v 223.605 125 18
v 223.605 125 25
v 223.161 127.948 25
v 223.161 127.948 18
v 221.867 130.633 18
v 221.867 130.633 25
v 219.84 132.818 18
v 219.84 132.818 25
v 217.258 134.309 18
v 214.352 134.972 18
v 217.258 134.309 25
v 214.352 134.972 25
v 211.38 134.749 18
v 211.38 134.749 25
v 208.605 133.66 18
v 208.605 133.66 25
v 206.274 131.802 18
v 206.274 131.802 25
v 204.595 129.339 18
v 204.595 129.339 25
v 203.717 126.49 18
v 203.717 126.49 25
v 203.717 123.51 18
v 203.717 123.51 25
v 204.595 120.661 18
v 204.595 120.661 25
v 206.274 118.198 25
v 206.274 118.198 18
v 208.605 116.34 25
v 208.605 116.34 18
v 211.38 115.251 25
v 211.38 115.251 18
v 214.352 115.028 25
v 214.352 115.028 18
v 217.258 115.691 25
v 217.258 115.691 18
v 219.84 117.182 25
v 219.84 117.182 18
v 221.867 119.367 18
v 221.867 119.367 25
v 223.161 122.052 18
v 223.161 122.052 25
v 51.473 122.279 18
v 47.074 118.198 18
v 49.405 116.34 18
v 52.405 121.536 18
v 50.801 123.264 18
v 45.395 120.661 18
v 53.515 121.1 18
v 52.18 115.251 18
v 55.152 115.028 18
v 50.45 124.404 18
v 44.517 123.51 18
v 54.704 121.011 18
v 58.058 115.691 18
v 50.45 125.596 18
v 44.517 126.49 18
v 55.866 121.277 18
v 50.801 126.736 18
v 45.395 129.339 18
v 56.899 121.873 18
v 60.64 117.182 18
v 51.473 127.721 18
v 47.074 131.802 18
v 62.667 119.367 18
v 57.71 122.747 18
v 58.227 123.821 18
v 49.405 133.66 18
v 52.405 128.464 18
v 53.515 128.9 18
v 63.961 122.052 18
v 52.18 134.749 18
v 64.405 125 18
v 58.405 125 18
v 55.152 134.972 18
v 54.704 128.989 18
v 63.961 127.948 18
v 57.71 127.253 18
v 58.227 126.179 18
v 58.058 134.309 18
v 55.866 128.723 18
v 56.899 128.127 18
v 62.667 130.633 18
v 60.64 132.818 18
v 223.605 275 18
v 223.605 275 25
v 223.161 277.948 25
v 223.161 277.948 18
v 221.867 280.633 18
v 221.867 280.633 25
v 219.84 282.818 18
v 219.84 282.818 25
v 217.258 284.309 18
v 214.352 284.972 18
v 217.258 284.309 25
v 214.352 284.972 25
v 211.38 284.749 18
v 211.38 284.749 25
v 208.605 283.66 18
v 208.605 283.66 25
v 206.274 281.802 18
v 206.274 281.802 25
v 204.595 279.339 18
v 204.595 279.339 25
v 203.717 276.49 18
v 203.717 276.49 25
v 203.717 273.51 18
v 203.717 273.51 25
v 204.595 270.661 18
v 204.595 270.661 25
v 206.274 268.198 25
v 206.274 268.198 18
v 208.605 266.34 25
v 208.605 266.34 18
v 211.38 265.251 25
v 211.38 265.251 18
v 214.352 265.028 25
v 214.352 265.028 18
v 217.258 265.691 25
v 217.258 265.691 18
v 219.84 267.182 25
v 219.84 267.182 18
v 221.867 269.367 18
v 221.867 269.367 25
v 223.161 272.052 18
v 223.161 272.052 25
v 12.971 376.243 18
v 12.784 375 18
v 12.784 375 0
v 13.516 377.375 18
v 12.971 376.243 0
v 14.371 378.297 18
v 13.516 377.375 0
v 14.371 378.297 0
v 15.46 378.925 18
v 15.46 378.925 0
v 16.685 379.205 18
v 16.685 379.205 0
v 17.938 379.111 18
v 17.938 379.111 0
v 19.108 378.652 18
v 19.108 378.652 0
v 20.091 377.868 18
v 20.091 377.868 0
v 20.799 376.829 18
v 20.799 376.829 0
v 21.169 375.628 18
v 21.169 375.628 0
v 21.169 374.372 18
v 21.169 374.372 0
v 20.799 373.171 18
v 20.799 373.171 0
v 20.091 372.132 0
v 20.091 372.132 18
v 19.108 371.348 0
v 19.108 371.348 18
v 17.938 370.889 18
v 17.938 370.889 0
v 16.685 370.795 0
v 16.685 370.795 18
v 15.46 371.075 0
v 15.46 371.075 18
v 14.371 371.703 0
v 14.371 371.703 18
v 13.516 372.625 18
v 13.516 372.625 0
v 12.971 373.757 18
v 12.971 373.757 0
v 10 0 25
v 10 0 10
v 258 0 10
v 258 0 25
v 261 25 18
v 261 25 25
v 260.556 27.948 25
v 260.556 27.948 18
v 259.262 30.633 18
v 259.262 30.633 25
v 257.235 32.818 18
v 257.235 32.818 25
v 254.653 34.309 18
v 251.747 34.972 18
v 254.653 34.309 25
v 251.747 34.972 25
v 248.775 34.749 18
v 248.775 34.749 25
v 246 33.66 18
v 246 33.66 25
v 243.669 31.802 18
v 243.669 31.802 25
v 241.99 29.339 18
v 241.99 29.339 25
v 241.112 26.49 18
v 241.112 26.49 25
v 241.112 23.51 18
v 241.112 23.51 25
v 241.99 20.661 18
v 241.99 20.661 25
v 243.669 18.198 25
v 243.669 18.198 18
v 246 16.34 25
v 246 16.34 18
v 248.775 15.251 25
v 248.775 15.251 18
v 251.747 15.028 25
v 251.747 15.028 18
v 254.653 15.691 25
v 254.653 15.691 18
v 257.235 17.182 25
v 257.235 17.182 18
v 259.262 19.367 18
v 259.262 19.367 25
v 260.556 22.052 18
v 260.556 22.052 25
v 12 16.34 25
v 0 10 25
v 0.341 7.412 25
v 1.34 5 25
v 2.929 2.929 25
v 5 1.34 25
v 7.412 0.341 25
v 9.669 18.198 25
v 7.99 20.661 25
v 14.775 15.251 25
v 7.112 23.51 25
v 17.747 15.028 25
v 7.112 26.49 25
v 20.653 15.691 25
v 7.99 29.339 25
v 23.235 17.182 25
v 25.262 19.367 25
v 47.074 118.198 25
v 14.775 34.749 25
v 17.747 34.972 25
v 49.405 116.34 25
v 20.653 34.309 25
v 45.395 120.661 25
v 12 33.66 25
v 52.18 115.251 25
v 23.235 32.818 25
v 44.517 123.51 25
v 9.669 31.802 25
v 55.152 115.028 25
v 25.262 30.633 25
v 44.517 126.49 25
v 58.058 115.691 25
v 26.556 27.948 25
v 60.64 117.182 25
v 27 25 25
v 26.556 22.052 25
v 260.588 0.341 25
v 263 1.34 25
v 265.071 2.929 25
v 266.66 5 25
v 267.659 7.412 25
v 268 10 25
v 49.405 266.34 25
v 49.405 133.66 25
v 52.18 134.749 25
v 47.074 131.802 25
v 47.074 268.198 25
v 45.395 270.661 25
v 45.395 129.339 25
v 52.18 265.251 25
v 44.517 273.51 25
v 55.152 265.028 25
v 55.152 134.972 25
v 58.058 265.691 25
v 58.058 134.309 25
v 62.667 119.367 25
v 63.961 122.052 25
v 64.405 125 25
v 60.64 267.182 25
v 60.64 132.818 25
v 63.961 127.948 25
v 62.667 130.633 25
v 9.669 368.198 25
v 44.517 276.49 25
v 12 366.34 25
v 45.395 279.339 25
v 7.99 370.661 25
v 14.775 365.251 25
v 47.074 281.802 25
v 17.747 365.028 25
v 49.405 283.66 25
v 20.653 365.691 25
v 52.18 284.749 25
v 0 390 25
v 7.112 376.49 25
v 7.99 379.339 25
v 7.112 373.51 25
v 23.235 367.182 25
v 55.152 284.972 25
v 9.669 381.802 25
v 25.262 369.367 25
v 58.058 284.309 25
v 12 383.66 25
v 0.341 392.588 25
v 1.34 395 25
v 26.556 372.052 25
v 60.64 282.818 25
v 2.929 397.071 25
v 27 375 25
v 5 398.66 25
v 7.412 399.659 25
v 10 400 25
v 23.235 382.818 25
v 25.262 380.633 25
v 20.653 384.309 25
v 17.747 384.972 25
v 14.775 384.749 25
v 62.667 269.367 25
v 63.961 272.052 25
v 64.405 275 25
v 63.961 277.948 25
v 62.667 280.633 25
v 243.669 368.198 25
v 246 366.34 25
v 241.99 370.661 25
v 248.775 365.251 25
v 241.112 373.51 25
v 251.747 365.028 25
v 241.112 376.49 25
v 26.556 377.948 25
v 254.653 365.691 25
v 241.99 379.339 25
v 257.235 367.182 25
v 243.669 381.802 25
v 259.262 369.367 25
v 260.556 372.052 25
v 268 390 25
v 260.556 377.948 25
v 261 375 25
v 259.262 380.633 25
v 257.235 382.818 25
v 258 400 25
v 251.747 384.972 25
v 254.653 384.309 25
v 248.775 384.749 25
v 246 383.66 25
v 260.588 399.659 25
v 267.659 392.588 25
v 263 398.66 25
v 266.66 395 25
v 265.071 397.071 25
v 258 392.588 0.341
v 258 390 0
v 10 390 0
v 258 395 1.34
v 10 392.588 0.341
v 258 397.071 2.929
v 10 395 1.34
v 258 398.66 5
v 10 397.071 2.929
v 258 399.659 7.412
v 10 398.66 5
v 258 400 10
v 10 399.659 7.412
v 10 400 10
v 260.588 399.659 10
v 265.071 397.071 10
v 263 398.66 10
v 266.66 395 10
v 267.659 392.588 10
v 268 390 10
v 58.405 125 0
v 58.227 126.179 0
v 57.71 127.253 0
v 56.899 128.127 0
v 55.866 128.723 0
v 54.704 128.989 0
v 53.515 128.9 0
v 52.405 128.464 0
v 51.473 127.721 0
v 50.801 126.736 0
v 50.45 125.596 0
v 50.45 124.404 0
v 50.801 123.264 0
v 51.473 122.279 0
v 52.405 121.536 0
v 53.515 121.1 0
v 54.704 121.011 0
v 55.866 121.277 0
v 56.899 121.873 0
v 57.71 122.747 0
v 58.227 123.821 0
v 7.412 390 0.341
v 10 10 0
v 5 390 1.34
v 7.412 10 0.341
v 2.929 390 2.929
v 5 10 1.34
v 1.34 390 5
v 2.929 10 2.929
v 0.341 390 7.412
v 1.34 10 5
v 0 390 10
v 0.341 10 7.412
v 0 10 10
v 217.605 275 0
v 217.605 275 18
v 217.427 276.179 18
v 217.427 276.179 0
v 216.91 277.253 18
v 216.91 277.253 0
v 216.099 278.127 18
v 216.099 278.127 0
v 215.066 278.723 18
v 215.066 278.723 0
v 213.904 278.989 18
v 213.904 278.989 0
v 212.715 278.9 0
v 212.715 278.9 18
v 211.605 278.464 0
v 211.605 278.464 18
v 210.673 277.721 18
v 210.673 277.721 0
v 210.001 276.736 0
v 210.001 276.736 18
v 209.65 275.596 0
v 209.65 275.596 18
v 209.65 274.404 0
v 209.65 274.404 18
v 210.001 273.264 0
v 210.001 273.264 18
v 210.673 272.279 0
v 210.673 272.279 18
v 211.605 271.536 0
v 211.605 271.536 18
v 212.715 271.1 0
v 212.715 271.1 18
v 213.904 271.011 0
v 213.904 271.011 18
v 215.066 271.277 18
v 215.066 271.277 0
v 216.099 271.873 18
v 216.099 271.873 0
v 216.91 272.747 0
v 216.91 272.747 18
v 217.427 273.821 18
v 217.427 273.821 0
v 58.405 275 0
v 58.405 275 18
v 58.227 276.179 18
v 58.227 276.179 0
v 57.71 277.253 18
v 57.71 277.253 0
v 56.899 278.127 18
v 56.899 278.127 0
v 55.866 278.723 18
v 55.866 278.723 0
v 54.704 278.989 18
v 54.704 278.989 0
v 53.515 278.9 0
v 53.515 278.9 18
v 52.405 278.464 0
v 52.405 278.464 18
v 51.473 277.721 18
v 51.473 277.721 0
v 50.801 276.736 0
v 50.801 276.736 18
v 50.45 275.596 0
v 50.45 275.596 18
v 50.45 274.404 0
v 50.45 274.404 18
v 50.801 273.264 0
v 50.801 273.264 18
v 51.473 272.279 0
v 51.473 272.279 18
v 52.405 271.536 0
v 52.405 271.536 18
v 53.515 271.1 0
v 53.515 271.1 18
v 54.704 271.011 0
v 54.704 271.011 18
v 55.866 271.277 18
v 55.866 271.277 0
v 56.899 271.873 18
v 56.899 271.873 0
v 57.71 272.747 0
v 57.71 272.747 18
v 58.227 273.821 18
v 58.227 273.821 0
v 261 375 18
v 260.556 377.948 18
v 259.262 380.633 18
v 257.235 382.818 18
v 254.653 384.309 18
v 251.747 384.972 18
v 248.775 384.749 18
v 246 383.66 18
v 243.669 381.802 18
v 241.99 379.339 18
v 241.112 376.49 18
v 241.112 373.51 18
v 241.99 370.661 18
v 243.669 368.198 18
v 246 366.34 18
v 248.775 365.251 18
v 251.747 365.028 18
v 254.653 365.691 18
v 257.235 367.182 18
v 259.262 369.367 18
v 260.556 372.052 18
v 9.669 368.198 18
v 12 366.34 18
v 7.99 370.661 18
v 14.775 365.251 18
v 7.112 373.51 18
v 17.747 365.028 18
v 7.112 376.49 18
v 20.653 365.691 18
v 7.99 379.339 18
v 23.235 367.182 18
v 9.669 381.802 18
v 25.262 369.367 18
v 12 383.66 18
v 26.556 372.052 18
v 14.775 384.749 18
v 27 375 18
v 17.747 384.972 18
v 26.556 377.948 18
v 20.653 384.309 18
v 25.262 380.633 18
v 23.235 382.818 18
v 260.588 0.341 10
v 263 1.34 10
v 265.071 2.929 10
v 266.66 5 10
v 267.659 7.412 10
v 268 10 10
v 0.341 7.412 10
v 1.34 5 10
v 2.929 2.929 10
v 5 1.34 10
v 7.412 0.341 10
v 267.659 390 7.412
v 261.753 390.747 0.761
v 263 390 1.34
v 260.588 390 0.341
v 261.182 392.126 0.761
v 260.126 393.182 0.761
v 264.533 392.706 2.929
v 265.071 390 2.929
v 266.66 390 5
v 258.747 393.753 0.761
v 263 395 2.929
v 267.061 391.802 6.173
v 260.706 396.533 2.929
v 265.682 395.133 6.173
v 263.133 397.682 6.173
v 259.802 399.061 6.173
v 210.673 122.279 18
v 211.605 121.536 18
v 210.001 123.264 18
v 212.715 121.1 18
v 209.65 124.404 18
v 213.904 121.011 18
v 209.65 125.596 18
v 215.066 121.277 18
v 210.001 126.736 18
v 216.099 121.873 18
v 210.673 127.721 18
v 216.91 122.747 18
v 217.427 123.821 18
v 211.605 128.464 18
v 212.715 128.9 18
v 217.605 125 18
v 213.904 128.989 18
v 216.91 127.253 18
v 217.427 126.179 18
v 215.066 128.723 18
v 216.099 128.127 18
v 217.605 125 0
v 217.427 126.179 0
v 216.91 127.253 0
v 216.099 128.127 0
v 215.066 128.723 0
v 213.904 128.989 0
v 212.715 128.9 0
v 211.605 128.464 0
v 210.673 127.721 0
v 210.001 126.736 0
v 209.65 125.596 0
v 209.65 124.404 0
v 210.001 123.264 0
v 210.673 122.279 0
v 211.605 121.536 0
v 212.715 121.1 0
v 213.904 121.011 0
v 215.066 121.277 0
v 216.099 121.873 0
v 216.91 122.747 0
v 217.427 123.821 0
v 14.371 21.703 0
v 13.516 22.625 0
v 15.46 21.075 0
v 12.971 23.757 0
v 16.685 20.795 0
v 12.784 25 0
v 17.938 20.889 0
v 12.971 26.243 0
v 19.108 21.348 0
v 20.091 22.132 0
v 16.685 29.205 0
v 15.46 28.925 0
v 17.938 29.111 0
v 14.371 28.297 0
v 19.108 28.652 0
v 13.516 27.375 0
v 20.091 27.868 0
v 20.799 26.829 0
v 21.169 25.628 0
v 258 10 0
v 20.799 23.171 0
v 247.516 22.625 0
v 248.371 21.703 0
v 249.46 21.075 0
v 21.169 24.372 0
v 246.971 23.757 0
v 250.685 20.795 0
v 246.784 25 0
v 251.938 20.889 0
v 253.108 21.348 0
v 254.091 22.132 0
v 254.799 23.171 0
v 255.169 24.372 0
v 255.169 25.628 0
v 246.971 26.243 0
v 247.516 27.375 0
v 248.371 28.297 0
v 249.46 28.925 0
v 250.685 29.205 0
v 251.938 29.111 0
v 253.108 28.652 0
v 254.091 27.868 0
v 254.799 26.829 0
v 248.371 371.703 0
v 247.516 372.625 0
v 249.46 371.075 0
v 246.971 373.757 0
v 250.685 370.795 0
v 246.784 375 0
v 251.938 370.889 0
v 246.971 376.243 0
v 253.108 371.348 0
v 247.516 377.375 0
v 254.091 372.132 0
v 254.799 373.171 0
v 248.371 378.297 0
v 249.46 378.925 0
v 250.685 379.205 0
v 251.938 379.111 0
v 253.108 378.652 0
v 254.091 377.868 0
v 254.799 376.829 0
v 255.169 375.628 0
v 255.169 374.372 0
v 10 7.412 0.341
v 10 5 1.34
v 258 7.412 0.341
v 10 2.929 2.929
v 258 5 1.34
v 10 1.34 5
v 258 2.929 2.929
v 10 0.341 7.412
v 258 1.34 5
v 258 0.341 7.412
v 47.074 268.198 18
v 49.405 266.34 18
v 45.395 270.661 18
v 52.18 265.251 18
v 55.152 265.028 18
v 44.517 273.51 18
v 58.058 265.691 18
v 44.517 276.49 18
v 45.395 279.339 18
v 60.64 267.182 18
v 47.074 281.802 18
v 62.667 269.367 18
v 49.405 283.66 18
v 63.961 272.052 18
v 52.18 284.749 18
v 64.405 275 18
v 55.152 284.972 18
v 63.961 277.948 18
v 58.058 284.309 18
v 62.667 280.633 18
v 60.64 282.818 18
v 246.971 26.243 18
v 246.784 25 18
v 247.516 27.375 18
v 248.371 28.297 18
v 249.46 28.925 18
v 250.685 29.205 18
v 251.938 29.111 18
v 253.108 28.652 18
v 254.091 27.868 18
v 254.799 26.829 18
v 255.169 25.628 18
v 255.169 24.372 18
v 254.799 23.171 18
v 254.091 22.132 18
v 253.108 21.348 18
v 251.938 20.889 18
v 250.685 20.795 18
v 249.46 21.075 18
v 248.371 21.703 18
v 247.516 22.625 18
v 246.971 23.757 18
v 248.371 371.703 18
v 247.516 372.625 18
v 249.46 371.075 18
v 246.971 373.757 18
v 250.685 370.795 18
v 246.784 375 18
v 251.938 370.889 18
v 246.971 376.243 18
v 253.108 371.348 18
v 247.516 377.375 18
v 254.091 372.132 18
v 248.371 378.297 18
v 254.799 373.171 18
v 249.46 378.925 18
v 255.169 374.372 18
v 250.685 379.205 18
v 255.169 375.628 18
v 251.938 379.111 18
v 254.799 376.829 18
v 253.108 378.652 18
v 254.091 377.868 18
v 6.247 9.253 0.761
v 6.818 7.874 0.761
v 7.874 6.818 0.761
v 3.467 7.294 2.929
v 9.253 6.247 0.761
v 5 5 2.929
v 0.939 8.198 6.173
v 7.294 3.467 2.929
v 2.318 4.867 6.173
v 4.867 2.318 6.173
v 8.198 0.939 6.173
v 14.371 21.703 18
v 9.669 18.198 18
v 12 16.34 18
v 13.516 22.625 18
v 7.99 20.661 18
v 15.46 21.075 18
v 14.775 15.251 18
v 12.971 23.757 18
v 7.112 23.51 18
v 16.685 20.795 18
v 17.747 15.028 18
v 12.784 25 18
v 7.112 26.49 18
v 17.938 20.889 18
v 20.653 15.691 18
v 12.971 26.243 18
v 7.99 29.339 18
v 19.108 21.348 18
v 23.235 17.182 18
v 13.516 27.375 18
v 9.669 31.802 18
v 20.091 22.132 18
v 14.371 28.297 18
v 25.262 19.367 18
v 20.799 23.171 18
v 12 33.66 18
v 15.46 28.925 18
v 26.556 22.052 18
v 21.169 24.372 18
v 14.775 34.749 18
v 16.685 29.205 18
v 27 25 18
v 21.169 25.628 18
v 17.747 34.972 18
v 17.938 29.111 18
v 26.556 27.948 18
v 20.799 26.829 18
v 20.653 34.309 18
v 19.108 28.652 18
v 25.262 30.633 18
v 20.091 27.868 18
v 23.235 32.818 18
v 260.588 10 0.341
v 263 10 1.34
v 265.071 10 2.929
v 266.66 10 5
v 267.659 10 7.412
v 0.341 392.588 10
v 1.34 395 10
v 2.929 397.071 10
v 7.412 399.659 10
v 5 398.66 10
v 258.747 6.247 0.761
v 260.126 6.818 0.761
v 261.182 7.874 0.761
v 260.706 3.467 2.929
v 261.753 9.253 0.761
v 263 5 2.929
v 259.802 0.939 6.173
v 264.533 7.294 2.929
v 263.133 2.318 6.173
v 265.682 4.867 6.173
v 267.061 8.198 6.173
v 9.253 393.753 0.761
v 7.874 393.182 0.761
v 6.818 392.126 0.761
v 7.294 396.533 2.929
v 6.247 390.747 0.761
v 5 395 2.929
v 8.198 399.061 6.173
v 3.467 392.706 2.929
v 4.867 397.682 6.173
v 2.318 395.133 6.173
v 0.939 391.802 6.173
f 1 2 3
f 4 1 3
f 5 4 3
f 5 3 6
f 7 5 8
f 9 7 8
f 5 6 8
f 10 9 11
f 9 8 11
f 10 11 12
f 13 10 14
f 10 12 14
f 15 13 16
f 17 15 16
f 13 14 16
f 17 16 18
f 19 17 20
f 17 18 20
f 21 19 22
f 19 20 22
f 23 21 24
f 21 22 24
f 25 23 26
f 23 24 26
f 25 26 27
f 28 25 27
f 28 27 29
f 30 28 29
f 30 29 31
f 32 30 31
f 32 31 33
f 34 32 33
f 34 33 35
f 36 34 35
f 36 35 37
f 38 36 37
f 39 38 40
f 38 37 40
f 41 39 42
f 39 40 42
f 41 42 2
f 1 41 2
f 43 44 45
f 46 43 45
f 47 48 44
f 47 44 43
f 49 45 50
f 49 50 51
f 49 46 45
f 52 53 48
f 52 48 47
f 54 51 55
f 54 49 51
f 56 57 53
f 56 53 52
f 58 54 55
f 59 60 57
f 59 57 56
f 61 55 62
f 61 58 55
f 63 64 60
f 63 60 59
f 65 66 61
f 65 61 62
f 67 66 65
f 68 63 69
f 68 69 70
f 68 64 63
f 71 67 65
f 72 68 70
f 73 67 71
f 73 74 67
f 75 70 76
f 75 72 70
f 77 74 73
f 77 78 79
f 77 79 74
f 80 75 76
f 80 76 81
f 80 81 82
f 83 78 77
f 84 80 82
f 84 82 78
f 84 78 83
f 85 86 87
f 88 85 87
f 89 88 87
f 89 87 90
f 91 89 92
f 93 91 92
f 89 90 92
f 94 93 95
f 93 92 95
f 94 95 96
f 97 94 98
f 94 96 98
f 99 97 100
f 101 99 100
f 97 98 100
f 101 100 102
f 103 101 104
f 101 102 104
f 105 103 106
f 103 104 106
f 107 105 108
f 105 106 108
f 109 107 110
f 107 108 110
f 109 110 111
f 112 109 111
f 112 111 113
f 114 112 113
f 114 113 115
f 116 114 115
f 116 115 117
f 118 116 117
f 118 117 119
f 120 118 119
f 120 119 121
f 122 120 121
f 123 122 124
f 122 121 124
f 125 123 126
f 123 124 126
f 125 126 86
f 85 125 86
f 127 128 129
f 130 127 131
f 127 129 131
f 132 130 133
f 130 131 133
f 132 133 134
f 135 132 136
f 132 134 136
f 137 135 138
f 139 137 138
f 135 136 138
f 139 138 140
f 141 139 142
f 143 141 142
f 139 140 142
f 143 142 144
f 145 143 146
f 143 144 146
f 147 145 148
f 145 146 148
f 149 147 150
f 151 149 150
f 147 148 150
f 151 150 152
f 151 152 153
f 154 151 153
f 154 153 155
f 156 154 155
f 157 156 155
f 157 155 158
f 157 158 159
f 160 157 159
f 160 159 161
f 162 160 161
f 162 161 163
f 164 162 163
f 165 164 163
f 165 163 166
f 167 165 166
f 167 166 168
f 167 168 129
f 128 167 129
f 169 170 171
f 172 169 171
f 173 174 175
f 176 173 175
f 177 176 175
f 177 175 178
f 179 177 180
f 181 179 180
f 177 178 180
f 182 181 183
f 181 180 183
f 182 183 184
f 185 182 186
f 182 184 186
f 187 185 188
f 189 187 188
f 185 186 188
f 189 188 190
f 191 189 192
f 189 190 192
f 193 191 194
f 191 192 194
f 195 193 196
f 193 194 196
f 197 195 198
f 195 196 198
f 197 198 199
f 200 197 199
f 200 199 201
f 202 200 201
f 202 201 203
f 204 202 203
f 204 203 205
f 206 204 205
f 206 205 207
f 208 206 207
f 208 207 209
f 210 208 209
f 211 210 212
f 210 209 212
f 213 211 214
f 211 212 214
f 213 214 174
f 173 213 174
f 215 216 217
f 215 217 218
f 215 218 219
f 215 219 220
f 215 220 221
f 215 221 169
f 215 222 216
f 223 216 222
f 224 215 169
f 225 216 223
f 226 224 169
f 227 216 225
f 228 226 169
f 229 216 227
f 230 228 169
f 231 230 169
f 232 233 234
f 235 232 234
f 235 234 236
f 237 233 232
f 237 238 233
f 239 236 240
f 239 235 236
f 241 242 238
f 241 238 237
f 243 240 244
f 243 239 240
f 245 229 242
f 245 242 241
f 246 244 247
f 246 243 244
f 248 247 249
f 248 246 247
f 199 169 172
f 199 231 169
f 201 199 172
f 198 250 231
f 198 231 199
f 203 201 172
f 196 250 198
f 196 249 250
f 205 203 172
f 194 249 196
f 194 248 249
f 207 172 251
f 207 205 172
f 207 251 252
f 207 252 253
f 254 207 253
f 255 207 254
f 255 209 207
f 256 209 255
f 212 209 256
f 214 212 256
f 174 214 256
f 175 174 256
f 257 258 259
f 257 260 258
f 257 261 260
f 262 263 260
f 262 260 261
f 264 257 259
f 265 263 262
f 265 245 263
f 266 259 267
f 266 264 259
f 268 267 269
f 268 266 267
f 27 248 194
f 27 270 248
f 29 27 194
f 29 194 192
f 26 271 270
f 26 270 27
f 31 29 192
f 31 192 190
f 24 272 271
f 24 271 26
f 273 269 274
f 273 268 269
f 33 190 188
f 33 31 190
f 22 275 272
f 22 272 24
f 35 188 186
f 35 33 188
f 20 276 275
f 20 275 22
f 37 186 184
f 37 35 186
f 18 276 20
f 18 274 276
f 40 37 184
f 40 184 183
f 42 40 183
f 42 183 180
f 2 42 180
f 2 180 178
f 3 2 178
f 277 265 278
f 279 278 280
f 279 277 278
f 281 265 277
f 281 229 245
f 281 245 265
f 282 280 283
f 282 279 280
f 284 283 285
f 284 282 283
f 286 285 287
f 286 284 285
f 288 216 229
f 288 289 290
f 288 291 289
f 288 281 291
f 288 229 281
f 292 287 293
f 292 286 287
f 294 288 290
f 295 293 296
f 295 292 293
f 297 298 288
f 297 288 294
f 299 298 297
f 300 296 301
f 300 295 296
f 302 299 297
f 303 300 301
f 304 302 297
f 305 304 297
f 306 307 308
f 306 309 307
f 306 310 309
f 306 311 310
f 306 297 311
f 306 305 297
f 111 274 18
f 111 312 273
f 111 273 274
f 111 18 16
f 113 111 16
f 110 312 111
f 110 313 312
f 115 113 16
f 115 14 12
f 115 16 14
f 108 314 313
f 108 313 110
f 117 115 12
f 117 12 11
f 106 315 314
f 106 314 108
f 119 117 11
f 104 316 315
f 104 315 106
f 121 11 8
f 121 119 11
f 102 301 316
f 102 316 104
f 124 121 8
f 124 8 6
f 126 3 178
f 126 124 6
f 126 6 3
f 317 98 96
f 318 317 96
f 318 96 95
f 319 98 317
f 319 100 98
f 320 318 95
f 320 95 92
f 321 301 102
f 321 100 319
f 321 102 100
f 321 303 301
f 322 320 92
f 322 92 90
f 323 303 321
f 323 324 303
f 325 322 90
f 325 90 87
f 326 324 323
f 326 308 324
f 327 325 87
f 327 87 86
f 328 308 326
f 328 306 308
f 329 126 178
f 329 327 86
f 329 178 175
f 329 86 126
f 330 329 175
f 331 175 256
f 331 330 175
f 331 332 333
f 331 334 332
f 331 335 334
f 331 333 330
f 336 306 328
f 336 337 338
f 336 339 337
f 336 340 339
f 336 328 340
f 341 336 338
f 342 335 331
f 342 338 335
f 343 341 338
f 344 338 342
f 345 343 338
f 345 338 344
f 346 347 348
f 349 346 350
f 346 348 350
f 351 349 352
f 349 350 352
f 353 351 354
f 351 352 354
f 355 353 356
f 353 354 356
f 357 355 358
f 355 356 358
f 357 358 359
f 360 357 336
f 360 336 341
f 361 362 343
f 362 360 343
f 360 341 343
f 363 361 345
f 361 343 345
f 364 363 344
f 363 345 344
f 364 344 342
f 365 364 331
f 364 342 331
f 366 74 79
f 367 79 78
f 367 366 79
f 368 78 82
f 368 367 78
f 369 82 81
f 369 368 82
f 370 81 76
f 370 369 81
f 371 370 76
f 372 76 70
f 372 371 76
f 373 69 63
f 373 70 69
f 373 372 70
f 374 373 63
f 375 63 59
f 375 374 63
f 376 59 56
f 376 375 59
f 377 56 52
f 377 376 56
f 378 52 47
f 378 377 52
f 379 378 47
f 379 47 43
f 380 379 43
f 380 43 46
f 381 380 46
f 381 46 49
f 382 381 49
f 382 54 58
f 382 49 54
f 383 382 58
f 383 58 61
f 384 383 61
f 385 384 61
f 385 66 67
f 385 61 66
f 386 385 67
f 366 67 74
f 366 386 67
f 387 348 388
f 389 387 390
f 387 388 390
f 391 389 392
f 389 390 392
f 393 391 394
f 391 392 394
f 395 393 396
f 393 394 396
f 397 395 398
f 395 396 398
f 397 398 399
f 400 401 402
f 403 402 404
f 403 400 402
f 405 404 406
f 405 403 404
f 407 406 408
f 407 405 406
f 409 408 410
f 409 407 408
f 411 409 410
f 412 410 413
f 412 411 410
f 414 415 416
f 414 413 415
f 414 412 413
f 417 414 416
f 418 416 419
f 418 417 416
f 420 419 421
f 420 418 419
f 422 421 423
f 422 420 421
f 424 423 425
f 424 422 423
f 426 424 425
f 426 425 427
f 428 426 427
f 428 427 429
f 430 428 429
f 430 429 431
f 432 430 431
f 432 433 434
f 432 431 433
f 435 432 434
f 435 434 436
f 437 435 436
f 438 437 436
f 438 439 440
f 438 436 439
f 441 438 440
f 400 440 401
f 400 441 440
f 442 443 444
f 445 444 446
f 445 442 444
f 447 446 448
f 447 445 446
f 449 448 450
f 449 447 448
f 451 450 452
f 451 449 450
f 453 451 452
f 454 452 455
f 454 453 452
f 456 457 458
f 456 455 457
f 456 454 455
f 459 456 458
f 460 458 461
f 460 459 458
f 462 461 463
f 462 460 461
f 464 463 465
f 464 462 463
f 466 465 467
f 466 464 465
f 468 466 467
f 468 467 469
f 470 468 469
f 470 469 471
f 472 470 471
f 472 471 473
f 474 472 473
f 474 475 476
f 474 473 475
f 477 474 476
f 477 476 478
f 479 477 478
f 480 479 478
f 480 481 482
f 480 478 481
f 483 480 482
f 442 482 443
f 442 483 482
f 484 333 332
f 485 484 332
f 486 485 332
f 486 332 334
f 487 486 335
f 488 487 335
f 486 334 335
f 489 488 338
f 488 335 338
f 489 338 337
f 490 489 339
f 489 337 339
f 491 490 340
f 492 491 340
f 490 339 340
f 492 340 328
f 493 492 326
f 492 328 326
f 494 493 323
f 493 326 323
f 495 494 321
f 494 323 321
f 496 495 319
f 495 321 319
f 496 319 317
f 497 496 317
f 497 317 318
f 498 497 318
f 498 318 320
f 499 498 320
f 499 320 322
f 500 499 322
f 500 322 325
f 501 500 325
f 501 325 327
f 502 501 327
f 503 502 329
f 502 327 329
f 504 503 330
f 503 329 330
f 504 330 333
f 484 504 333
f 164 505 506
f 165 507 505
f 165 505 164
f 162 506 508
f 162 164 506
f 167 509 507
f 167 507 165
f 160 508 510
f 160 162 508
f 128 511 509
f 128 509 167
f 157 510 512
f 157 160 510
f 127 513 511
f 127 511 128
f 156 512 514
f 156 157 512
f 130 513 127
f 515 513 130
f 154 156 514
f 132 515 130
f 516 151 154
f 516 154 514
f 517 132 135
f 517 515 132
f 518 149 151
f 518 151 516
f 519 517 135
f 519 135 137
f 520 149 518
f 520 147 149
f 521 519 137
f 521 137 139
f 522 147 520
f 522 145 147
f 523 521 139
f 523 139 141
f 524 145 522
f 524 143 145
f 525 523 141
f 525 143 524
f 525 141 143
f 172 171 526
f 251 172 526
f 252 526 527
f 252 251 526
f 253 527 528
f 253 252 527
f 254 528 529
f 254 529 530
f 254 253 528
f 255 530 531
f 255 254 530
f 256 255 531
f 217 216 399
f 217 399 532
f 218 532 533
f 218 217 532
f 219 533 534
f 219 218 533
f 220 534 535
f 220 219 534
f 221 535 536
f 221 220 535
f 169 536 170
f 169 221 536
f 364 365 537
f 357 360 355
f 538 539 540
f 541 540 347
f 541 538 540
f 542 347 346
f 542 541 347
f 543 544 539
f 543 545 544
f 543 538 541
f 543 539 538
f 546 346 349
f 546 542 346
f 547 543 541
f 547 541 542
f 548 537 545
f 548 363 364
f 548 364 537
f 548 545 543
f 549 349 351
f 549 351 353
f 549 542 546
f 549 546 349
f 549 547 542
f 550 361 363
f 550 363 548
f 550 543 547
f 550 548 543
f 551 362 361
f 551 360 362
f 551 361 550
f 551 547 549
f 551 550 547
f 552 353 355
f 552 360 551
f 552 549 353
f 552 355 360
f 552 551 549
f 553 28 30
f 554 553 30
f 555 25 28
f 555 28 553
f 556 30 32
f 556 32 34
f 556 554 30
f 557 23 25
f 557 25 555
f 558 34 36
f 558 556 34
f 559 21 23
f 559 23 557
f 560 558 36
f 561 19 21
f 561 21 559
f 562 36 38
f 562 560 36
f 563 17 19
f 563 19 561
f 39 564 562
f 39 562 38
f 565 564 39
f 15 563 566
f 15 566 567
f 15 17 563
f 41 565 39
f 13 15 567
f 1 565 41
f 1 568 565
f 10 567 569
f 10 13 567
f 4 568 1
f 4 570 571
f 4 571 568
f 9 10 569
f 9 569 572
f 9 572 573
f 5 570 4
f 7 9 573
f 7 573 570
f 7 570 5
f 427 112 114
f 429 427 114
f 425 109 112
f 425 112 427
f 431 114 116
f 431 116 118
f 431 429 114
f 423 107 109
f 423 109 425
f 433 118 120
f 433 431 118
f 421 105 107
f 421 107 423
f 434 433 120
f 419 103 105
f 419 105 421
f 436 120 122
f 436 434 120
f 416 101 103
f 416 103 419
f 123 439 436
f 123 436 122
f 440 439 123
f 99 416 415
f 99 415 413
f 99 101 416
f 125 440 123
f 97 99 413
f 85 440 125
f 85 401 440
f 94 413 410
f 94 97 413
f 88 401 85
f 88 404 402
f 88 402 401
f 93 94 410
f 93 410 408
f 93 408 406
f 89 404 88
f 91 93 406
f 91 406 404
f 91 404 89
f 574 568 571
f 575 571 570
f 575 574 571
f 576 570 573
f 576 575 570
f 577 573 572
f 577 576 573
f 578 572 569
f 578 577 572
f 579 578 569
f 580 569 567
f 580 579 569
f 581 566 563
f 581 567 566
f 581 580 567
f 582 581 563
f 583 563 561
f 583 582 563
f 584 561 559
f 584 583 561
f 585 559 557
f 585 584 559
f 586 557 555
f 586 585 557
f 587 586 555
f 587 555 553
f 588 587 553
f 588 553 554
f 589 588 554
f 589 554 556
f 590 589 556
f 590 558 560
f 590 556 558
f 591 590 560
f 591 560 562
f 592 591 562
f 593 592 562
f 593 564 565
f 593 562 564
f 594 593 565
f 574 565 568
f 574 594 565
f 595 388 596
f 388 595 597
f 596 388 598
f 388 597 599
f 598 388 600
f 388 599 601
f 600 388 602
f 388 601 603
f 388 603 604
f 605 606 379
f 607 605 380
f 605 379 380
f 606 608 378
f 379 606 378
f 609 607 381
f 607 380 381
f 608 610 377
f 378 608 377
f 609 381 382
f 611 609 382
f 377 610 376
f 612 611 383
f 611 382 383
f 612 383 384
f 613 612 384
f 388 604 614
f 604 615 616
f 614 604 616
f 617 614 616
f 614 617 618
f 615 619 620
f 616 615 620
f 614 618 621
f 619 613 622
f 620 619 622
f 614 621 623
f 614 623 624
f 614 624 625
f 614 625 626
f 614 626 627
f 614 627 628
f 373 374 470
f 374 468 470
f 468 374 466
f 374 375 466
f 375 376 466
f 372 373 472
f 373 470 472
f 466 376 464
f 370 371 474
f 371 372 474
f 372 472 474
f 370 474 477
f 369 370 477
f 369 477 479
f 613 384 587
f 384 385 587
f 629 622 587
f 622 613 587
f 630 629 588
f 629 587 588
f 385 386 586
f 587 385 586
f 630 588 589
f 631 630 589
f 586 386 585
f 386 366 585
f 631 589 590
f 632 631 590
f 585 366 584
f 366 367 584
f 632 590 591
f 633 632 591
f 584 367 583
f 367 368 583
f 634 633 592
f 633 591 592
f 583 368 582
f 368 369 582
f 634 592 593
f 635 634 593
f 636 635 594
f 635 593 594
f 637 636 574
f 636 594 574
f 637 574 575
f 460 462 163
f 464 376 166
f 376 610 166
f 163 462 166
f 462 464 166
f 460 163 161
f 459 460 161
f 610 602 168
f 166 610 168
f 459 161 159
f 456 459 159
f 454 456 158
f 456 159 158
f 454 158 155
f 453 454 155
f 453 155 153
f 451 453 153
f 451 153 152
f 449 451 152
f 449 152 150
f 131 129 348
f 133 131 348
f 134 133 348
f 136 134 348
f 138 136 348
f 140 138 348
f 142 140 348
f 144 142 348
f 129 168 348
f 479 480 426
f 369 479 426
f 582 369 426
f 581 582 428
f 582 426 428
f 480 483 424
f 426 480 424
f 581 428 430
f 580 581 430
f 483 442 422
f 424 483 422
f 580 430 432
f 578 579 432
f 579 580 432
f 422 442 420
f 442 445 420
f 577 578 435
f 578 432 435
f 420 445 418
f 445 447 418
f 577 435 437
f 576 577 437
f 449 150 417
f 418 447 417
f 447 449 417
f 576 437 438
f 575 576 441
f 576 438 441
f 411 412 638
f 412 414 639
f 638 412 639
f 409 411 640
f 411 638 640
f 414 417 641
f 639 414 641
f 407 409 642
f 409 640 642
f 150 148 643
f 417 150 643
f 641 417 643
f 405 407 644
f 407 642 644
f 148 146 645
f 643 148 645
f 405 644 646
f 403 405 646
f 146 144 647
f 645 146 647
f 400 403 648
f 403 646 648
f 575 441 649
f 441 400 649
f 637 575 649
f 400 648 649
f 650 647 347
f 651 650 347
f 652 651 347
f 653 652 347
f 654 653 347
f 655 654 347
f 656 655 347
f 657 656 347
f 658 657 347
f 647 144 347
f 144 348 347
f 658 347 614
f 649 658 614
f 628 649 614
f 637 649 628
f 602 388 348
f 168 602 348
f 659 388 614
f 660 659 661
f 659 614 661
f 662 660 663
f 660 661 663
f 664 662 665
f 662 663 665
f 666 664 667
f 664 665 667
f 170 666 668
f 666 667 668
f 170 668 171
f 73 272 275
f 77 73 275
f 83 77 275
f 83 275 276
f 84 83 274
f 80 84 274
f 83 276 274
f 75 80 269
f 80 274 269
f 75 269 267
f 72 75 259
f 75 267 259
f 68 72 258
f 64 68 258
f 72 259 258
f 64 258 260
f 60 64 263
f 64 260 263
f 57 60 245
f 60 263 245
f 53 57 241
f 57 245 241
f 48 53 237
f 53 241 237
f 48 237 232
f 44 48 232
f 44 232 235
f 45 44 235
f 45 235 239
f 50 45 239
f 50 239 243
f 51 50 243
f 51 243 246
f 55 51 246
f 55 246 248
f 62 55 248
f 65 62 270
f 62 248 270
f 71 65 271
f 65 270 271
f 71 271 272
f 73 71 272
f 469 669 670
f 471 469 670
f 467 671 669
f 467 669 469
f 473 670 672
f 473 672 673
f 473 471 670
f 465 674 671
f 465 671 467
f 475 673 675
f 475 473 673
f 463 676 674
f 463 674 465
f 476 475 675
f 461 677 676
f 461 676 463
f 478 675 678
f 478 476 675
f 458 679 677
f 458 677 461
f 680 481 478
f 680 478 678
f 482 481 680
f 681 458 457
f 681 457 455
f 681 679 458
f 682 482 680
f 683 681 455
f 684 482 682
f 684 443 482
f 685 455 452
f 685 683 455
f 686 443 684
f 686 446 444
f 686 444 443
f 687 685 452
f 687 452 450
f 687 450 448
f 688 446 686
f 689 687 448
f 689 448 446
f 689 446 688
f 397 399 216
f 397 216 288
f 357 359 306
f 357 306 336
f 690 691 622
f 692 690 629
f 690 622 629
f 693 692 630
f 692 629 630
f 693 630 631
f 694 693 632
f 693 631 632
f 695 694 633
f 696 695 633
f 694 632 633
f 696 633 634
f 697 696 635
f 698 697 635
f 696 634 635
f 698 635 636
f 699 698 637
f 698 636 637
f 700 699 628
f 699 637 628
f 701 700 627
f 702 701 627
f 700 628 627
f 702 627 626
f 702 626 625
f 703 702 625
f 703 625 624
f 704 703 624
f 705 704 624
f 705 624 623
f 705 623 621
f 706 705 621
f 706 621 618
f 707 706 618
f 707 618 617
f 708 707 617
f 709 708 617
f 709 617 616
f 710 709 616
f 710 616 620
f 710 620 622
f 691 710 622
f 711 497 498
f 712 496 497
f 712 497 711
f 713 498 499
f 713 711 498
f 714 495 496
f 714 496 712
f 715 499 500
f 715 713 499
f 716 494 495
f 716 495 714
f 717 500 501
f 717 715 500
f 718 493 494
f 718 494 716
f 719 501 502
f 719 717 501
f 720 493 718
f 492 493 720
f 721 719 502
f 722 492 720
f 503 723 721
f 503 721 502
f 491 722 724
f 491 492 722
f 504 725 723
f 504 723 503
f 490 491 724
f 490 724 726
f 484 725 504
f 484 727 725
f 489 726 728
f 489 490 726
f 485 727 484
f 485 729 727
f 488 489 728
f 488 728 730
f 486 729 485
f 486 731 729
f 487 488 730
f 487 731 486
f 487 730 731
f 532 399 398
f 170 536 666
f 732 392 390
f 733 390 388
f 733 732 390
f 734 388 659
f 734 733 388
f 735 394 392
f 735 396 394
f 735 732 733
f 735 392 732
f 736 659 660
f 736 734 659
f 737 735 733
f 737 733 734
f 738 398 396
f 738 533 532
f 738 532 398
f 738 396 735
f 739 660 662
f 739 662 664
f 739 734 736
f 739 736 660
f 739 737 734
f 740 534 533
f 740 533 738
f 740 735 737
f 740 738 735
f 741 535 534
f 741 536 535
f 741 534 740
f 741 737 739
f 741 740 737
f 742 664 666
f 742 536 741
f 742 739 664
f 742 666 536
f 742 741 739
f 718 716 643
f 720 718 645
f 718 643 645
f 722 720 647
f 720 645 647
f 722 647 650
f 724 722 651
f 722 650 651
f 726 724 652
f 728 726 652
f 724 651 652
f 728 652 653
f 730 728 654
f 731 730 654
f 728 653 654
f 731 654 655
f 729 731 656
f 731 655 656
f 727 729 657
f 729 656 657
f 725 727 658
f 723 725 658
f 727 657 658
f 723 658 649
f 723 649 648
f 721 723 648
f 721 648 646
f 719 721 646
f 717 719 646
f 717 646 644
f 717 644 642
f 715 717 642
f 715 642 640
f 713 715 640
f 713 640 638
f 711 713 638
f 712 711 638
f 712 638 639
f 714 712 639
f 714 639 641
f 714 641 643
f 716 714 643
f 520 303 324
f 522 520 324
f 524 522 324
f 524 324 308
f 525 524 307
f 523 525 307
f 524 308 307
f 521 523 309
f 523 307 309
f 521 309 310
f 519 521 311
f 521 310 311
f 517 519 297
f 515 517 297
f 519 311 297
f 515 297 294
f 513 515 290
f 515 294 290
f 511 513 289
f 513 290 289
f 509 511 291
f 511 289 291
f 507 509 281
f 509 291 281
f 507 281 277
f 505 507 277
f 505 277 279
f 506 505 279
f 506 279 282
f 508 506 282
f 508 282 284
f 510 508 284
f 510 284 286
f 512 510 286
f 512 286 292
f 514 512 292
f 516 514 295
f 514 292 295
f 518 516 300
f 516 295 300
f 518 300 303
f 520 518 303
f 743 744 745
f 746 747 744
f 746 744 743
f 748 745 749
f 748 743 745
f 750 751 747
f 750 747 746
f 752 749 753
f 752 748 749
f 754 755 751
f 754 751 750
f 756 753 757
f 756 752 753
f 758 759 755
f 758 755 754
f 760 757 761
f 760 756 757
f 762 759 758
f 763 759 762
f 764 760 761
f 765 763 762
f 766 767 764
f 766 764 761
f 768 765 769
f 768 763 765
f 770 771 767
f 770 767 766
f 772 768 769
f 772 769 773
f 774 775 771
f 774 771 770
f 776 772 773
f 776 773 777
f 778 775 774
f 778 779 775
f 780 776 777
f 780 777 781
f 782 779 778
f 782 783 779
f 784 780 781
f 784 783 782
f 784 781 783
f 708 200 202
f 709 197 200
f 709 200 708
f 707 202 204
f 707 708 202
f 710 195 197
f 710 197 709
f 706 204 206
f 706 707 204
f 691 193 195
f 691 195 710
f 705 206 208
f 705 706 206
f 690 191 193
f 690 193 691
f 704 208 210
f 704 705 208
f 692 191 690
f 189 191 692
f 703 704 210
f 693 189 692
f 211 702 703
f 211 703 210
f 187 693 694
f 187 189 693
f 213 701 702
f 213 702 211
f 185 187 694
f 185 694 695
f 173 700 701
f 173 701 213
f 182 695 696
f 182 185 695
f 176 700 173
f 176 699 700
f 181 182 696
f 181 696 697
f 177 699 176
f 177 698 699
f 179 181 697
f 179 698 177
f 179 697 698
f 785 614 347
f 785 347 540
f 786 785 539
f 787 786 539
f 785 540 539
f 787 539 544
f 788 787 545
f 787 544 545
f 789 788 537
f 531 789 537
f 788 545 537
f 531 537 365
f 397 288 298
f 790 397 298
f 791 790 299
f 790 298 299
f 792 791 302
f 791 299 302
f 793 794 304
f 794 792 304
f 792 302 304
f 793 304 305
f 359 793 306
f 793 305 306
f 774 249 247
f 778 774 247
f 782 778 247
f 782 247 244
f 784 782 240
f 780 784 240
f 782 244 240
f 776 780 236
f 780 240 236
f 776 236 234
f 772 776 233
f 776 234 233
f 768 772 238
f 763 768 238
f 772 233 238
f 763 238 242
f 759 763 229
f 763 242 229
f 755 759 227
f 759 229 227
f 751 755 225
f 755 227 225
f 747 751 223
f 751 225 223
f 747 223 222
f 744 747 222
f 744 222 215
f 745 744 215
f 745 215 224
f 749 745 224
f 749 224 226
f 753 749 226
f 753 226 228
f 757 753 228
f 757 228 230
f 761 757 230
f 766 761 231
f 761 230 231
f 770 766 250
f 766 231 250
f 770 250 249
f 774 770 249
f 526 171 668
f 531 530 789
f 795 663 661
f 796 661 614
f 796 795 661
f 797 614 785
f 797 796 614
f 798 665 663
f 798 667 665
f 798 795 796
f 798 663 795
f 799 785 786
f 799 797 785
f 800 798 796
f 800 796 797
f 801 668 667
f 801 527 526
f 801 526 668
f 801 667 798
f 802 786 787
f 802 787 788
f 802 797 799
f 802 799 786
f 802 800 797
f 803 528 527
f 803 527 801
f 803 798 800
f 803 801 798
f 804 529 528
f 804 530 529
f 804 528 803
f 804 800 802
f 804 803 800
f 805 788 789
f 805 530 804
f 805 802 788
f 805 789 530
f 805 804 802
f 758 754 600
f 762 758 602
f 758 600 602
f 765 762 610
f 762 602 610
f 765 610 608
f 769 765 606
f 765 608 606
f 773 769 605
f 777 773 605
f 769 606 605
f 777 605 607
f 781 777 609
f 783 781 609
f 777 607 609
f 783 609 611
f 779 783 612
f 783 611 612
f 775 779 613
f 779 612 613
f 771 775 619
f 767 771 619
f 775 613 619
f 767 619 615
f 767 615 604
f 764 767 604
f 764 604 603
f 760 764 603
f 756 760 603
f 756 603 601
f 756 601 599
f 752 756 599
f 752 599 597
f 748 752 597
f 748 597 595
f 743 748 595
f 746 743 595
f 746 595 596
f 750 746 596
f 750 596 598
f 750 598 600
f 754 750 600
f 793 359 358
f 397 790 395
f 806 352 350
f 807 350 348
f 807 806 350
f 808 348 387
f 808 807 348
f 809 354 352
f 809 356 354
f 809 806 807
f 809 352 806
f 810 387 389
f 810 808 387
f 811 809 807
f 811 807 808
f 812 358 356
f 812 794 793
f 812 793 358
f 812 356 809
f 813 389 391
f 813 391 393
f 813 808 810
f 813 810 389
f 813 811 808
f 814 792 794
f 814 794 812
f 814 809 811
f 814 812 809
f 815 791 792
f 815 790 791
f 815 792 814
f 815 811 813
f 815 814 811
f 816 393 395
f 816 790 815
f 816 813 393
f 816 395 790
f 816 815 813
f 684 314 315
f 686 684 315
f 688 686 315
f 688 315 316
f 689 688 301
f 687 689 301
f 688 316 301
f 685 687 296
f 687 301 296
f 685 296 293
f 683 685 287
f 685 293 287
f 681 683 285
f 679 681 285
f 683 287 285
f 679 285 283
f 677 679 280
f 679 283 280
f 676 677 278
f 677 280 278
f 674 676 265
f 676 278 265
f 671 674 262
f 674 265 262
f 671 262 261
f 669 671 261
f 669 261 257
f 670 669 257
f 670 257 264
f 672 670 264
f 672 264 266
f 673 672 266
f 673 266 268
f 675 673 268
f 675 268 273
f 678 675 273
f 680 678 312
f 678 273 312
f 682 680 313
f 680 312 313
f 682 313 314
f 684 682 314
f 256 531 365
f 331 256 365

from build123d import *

# Parameters (mm, degrees)
CROQUIS1_W                         = 268
CROQUIS1_H                         = 400
CROQUIS1_R                         = 4
SALIENTE_EXTRUIR1_DEPTH            = 25
CROQUIS2_R                         = 10
CORTAR_EXTRUIR1_DEPTH              = 7
REDONDEO1_R                        = 10
REDONDEO2_R                        = 10
CROQUIS3_R                         = 10
CORTAR_EXTRUIR2_DEPTH              = 7
TALADRO_DE_MARGEN_PARA_5_161_D     = 8.4328
TALADRO_DE_MARGEN_PARA_5_161_DEPTH = 18


with BuildPart() as part:
    # Croquis1 → Saliente-Extruir1 (new body)
    with BuildSketch(Plane.XY):
        with Locations((134, 200)):
            Rectangle(CROQUIS1_W, CROQUIS1_H)
        with Locations((54.405, 275)):
            Circle(CROQUIS1_R, mode=Mode.SUBTRACT)
        with Locations((213.605, 275)):
            Circle(CROQUIS1_R, mode=Mode.SUBTRACT)
        with Locations((213.605, 125)):
            Circle(CROQUIS1_R, mode=Mode.SUBTRACT)
        with Locations((54.405, 125)):
            Circle(CROQUIS1_R, mode=Mode.SUBTRACT)
    extrude(amount=SALIENTE_EXTRUIR1_DEPTH)

    # Croquis2 → Cortar-Extruir1 (cut)
    with BuildSketch(Plane.XY.offset(25)):
        with Locations((54.405, 275)):
            Circle(CROQUIS2_R)
        with Locations((213.605, 275)):
            Circle(CROQUIS2_R)
        with Locations((213.605, 125)):
            Circle(CROQUIS2_R)
        with Locations((54.405, 125)):
            Circle(CROQUIS2_R)
    extrude(amount=-CORTAR_EXTRUIR1_DEPTH, mode=Mode.SUBTRACT)

    # Redondeo1
    redondeo1_edges = [part.edges().sort_by_distance(p)[0] for p in [
        (0, 400, 12.5),
        (268, 400, 12.5),
        (268, 0, 12.5),
        (0, 0, 12.5),
    ]]
    fillet(redondeo1_edges, radius=REDONDEO1_R)

    # Redondeo2
    redondeo2_edges = [part.edges().sort_by_distance(p)[0] for p in [
        (268, 200, 0),
        (0, 200, 0),
        (134, 400, 0),
        (134, 0, 0),
        (2.928932188, 397.071067812, 0),
        (265.071067812, 397.071067812, 0),
        (2.928932188, 2.928932188, 0),
        (265.071067812, 2.928932188, 0),
    ]]
    fillet(redondeo2_edges, radius=REDONDEO2_R)

    # Croquis3 → Cortar-Extruir2 (cut)
    with BuildSketch(Plane.XY.offset(25)):
        with Locations((17, 375)):
            Circle(CROQUIS3_R)
        with Locations((251, 375)):
            Circle(CROQUIS3_R)
        with Locations((251, 25)):
            Circle(CROQUIS3_R)
        with Locations((17, 25)):
            Circle(CROQUIS3_R)
    extrude(amount=-CORTAR_EXTRUIR2_DEPTH, mode=Mode.SUBTRACT)

    # Taladro de margen para 5/161
    with Locations(Plane.XY.offset(18)):
        with Locations((17, 25), (251, 25), (251, 375), (17, 375)):
            Hole(TALADRO_DE_MARGEN_PARA_5_161_D / 2, depth=TALADRO_DE_MARGEN_PARA_5_161_DEPTH)


solid = part.part
